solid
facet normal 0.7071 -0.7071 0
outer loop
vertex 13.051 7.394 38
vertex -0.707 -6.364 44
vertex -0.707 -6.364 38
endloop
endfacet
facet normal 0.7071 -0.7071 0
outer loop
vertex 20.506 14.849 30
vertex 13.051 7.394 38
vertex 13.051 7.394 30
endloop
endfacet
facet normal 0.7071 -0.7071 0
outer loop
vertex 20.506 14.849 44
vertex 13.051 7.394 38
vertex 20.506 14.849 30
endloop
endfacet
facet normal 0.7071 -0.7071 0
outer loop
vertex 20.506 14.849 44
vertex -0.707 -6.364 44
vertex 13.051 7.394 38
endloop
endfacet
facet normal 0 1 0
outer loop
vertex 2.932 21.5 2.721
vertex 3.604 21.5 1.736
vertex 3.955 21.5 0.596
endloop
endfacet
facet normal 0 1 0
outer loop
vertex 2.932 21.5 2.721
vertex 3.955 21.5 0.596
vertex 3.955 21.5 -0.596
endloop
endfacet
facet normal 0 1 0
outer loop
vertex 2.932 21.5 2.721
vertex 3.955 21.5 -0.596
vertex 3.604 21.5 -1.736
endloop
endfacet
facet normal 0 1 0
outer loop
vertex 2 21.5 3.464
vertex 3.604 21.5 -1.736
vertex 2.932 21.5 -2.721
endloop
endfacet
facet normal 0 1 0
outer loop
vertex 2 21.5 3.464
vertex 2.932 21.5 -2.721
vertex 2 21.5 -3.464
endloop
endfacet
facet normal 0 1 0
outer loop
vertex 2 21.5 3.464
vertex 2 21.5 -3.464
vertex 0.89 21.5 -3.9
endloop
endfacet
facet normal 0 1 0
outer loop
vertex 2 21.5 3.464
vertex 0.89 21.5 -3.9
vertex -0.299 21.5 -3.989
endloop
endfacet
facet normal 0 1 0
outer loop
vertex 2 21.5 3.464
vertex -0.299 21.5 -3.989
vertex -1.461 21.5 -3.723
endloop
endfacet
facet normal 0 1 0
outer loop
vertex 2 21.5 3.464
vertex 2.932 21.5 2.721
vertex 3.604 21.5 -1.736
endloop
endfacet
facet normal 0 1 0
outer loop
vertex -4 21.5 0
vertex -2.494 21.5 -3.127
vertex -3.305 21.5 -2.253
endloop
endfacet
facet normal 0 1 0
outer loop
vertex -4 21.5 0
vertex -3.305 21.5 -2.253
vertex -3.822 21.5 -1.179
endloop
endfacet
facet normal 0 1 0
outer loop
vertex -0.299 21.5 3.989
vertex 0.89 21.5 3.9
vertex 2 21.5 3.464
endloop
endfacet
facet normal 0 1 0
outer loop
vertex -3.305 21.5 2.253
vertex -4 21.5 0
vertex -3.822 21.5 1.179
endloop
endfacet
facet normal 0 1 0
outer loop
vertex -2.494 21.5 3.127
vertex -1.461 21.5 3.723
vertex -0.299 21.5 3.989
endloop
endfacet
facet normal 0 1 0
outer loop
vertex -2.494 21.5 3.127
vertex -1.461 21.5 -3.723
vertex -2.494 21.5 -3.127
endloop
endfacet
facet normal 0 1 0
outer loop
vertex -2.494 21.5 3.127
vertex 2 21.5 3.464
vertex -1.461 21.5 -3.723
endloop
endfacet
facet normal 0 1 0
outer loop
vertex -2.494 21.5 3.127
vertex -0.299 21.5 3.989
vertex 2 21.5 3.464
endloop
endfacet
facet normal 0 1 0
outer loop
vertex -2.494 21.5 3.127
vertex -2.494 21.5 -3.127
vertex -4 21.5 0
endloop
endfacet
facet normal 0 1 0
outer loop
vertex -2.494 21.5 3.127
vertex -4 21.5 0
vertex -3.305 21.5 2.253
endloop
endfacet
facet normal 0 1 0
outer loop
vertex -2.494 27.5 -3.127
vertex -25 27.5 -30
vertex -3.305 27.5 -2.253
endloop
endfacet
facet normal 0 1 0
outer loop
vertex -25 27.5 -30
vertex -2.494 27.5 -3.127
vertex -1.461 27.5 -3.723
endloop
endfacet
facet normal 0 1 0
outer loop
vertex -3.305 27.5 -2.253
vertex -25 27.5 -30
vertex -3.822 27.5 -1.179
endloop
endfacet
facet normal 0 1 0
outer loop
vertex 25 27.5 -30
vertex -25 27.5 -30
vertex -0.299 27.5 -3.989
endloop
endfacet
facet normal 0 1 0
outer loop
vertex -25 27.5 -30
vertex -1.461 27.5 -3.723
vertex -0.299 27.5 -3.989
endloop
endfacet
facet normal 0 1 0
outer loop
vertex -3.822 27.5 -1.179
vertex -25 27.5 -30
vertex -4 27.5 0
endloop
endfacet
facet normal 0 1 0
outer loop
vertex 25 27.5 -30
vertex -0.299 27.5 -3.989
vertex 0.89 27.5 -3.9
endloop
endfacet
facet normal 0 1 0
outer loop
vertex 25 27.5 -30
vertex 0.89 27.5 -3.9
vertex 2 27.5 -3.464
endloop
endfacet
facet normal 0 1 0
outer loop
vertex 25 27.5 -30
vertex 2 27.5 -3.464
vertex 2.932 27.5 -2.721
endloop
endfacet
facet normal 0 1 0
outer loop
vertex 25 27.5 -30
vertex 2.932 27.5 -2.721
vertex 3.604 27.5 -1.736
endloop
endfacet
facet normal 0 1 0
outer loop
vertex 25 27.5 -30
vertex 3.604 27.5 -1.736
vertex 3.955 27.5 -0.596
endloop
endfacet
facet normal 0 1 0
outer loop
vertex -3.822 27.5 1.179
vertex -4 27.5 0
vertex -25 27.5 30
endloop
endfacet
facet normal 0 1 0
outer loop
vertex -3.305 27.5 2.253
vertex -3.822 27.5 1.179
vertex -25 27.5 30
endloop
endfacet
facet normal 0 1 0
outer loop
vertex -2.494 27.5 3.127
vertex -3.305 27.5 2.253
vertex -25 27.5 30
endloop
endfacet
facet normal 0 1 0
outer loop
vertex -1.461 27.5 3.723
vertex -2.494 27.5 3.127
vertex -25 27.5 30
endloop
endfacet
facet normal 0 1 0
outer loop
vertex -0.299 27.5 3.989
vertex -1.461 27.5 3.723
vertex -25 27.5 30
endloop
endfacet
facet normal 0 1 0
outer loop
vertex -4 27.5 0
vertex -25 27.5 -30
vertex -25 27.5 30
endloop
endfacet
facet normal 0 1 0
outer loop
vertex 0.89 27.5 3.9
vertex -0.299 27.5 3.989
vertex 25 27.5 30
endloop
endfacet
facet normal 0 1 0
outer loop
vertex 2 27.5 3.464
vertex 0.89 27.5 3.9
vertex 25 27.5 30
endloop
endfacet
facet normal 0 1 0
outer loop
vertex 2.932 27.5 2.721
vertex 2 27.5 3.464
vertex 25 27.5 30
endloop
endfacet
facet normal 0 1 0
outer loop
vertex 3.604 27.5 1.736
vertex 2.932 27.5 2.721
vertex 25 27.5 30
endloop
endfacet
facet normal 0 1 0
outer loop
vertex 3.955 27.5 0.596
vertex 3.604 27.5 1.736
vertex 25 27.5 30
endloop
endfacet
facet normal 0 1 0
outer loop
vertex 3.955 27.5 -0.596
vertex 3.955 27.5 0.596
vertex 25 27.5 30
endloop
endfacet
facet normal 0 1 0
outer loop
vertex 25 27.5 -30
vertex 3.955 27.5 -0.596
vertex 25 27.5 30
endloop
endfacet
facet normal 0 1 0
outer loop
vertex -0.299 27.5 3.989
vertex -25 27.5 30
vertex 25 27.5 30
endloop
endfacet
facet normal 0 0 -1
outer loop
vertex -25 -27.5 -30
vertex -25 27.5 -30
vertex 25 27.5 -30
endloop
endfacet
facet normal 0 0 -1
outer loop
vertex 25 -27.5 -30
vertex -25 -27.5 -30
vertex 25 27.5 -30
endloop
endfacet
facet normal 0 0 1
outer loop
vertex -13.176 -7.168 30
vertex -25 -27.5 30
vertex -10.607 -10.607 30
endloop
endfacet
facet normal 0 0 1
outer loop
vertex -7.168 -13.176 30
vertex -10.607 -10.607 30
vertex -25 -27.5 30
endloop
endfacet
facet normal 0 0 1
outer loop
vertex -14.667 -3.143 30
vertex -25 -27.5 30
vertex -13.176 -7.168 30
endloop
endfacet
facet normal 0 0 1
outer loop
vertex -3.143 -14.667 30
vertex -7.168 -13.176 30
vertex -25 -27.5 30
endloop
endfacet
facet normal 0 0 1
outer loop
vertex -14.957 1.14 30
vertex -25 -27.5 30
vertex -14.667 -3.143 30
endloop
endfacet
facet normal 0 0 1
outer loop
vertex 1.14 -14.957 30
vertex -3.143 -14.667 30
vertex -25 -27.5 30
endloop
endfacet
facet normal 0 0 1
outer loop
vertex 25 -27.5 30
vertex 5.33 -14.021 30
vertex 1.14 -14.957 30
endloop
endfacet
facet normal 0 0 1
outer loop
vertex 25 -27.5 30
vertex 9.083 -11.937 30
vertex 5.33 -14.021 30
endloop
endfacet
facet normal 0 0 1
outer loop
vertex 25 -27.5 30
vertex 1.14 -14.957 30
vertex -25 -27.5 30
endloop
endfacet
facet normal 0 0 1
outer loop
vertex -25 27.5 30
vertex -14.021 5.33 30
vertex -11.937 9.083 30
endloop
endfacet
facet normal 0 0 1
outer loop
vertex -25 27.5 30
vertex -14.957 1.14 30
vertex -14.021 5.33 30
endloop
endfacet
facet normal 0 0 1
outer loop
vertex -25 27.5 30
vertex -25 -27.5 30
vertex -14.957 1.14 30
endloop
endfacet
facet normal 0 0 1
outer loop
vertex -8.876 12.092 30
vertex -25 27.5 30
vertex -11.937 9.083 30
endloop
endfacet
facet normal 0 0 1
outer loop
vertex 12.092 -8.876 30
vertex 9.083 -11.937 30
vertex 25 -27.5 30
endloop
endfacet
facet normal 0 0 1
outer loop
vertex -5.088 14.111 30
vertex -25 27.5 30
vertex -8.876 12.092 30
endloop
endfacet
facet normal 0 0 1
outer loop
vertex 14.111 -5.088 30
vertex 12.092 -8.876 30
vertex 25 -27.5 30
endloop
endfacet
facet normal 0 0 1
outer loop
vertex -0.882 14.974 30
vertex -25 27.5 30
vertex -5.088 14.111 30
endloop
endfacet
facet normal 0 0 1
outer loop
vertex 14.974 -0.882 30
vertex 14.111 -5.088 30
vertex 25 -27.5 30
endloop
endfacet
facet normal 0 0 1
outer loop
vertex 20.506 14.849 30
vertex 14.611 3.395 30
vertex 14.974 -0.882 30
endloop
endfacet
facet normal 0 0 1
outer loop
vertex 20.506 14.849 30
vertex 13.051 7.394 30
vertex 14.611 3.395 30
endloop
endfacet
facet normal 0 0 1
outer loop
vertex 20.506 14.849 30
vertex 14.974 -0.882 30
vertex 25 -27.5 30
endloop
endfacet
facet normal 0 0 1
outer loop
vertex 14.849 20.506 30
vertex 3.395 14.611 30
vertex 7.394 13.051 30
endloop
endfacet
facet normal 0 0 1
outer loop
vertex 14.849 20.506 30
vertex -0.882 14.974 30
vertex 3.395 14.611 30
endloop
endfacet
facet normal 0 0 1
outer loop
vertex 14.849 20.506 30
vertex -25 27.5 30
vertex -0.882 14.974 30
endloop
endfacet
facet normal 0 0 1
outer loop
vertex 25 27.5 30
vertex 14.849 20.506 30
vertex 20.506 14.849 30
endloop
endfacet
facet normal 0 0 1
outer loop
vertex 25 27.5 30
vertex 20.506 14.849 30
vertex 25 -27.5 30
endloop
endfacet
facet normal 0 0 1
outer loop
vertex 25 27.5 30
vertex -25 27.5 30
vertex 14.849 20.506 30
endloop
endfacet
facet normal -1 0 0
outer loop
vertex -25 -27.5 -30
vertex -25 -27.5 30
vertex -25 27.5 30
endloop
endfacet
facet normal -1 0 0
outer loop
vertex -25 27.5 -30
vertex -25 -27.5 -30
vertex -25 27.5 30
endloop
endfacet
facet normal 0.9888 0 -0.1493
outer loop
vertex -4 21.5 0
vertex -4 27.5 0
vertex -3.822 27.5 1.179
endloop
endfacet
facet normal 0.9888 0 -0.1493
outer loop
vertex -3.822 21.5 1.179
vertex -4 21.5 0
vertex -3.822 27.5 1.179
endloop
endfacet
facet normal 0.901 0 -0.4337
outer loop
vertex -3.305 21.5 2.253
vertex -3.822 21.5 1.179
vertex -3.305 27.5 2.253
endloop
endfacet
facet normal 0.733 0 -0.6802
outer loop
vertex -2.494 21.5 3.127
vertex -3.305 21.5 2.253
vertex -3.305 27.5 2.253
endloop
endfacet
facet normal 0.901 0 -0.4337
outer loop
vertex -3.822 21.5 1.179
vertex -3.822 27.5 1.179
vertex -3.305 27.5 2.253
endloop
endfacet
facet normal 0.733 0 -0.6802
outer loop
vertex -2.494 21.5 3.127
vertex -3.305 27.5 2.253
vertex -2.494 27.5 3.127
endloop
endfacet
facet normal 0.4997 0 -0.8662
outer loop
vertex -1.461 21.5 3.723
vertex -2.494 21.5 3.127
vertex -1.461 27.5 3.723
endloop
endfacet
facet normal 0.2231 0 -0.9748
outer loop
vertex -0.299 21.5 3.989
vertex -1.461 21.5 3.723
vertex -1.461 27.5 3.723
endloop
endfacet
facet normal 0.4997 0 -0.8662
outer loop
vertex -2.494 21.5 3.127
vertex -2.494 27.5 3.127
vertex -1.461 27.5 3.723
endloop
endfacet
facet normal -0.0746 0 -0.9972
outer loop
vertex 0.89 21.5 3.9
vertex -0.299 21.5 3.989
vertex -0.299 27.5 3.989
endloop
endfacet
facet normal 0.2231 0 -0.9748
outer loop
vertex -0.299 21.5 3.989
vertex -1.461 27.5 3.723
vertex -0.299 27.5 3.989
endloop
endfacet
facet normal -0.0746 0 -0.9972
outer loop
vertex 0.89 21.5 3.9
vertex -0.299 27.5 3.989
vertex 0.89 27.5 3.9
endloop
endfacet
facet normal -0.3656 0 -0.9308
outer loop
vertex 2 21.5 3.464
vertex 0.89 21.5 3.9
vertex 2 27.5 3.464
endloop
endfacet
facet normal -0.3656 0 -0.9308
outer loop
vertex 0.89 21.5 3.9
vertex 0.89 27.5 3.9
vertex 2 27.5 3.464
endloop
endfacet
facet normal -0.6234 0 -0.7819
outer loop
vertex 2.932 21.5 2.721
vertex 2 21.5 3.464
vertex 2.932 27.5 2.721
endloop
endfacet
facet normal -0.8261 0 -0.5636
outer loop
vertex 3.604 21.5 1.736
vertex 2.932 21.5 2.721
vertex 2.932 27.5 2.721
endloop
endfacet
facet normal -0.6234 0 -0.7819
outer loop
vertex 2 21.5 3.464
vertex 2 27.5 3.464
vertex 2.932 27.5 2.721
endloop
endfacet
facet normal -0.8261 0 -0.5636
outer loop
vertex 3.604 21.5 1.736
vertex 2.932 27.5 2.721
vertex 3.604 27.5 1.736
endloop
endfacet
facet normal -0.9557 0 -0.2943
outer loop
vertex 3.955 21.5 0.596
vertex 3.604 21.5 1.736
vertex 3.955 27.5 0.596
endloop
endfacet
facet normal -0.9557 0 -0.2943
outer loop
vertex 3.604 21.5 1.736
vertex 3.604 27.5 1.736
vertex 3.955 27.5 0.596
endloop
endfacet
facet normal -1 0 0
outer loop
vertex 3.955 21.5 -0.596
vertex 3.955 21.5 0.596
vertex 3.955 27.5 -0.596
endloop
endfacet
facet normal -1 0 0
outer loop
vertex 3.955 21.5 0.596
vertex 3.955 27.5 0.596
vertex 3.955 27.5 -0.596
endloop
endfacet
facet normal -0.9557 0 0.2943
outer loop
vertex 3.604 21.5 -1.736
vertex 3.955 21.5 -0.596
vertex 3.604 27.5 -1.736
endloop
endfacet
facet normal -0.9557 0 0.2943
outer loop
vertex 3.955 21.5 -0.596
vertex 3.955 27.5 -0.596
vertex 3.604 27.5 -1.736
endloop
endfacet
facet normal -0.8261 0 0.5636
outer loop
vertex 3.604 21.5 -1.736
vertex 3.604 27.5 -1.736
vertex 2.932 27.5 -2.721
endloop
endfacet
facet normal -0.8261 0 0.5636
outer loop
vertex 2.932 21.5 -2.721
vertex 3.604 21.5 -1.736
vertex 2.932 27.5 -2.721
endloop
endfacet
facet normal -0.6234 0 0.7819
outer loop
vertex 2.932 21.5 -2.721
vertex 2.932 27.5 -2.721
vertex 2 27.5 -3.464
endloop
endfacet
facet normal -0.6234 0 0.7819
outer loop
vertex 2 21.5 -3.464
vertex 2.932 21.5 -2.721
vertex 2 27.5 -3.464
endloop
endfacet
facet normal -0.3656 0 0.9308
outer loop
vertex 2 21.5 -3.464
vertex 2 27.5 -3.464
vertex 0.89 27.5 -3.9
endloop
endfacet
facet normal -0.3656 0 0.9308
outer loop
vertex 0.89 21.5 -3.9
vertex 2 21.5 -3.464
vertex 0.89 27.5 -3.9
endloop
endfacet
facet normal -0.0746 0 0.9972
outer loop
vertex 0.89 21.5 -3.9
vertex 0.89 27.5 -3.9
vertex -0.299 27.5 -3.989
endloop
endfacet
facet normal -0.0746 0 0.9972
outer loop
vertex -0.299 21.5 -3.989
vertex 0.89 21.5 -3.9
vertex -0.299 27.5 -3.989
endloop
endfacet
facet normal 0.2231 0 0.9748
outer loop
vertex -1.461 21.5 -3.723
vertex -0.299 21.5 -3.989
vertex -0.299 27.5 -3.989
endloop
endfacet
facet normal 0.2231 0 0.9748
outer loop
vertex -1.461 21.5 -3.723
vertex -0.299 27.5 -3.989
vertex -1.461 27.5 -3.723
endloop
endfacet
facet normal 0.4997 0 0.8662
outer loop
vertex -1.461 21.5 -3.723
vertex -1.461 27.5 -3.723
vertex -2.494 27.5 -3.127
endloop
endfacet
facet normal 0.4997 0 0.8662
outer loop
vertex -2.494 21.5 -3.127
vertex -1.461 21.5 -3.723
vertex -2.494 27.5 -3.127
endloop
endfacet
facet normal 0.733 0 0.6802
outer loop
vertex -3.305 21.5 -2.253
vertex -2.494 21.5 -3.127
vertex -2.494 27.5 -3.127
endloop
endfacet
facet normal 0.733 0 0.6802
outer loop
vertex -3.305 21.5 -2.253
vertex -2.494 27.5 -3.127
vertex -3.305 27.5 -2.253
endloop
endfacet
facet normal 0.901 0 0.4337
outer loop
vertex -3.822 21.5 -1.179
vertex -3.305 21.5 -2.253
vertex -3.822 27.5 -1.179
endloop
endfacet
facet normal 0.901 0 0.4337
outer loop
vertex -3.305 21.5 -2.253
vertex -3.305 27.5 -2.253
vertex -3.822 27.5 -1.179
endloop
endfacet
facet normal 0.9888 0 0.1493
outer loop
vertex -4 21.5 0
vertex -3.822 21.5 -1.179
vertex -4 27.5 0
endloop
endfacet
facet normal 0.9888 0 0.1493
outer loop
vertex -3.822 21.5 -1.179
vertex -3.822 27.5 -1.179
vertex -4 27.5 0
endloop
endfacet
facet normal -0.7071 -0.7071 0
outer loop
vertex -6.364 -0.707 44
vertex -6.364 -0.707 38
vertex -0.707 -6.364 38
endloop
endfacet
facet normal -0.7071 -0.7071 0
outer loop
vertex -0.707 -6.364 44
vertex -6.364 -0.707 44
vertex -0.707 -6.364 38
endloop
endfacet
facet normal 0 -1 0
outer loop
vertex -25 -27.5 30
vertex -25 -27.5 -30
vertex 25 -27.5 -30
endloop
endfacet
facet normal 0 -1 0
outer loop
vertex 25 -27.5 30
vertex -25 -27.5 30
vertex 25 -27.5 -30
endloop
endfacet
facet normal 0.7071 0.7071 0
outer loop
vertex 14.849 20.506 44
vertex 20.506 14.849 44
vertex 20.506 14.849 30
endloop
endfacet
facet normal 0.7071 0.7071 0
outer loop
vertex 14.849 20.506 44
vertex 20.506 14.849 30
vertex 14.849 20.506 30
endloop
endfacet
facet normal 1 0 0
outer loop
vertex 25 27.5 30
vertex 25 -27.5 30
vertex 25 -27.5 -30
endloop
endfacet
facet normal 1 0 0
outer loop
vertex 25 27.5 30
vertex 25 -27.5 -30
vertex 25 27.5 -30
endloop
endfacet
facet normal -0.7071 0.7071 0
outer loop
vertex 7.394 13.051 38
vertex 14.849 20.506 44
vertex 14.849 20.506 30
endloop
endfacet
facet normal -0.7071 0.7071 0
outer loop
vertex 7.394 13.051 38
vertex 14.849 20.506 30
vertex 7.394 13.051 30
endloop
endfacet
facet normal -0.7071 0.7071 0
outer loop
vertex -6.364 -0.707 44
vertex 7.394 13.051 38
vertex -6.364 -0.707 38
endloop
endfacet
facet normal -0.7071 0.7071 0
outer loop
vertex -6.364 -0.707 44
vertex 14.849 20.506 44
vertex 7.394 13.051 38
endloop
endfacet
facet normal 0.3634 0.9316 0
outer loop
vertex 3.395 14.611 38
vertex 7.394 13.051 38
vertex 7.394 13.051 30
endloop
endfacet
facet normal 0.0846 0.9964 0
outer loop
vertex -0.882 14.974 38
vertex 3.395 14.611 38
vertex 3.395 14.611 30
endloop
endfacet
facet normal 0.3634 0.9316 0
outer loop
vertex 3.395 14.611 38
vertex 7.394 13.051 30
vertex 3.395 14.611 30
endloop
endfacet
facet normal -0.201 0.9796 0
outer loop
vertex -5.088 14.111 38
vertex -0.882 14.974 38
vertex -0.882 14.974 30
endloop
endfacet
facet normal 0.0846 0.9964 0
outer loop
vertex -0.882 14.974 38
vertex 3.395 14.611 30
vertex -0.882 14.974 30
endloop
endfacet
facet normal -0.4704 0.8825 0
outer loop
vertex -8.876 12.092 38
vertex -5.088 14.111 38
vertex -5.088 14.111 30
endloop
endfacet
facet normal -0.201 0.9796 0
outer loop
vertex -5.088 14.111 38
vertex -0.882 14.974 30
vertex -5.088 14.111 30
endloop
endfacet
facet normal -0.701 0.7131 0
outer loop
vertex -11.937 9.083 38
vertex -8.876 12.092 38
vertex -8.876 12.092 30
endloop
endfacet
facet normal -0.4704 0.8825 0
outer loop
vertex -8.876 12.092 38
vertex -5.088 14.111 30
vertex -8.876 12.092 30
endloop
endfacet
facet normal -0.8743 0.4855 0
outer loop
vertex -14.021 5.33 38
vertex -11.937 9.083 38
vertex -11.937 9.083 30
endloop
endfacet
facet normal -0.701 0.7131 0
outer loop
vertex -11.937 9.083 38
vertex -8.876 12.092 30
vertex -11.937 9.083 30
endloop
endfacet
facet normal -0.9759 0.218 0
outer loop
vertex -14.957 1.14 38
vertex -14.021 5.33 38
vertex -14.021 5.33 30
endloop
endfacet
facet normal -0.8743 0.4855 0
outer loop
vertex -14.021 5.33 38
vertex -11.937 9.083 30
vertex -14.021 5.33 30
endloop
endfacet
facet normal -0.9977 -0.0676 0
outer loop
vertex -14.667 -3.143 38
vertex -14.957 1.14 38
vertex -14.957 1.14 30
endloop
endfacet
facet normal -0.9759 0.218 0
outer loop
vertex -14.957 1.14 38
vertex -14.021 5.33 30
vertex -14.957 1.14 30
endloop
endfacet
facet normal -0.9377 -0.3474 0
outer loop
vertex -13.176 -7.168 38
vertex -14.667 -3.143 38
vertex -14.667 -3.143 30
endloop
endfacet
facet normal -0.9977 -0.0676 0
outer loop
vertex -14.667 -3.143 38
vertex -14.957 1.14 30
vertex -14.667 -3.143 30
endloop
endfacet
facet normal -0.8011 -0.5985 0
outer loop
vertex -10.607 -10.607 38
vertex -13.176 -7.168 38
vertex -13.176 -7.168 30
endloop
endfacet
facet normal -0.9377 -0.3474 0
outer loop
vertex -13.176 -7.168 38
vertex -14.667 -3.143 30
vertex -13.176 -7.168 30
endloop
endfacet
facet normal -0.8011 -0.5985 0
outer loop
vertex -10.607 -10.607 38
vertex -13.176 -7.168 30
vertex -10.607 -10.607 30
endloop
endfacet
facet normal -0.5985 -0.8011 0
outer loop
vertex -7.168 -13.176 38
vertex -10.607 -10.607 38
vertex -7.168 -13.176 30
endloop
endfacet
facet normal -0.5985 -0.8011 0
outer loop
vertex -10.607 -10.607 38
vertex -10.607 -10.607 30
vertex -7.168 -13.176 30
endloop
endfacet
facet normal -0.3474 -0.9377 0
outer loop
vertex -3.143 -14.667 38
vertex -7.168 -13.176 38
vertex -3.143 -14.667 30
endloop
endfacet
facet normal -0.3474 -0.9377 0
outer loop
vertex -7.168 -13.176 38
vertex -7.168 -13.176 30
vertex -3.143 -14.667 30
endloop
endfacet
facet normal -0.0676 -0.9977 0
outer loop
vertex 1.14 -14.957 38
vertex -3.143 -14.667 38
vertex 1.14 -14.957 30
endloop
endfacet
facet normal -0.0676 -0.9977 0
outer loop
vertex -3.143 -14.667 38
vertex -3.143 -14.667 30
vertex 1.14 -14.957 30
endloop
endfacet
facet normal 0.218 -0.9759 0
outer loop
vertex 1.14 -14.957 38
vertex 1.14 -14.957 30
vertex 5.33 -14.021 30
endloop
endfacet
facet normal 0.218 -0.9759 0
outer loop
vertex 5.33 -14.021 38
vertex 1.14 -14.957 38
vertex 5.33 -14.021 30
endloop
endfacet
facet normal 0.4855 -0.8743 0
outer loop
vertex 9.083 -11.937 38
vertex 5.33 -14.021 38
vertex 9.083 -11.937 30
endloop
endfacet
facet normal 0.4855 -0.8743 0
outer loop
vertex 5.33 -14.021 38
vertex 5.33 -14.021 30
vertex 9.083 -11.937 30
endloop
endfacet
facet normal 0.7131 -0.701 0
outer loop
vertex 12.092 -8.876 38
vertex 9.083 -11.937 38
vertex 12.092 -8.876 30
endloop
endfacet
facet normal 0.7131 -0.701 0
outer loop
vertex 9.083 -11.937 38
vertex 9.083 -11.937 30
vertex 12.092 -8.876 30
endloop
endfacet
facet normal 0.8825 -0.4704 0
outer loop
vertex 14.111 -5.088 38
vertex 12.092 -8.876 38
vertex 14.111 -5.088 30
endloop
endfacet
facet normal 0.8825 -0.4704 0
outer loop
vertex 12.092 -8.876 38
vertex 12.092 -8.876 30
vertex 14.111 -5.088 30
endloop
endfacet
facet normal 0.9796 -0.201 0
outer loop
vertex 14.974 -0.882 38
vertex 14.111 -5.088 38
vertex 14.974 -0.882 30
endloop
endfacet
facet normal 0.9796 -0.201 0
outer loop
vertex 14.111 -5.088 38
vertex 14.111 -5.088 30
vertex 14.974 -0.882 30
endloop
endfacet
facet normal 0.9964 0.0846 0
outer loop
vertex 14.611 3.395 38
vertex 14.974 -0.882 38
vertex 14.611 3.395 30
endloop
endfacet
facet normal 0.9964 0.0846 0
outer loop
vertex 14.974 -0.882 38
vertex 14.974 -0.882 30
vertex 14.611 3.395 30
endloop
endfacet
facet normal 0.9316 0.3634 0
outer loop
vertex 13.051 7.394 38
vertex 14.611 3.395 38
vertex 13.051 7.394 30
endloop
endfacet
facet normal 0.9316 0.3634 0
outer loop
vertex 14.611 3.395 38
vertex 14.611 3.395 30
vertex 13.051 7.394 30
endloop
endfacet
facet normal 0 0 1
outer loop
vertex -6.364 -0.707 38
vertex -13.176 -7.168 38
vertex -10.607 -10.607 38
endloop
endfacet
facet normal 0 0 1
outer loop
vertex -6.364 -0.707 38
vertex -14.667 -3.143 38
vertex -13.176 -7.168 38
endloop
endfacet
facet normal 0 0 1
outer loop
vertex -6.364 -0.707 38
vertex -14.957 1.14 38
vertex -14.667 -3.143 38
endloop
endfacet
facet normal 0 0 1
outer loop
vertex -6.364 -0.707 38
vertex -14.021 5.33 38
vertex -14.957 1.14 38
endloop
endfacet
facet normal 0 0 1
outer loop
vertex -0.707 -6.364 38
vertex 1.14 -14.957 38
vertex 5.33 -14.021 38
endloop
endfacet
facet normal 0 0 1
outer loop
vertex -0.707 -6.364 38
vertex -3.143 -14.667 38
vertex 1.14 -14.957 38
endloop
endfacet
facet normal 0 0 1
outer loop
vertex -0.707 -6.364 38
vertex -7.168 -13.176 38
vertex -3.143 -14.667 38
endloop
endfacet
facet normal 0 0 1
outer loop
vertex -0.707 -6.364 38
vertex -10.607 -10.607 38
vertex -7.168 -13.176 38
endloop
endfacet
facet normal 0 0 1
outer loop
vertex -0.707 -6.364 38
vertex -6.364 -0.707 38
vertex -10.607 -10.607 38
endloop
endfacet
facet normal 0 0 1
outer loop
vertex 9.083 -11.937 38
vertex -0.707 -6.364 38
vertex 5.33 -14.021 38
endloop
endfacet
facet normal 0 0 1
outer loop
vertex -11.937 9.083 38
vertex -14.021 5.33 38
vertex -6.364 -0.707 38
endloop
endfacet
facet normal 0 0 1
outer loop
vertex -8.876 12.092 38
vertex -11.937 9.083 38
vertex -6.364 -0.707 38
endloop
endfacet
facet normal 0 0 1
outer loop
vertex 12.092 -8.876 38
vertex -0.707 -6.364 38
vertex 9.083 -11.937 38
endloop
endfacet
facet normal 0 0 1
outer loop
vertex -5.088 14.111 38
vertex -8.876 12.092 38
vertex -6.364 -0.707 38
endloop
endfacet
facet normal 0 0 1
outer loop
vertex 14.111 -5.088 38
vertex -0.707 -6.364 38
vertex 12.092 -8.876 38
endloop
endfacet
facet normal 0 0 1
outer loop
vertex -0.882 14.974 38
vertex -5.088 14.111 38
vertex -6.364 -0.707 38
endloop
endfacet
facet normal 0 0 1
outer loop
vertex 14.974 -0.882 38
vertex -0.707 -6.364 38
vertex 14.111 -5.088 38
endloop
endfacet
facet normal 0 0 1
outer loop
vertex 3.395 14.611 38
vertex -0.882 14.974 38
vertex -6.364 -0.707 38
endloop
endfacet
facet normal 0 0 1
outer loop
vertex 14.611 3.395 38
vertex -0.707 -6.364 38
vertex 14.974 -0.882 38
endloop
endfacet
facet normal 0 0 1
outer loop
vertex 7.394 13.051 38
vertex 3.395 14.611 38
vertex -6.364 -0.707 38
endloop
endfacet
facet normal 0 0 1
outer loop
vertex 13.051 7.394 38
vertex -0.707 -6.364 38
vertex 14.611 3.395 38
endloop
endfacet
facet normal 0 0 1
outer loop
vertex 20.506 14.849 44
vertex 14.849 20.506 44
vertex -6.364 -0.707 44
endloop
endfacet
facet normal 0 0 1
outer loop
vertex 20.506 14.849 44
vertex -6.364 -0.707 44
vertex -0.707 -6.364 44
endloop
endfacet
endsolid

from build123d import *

# Parameters (mm, degrees)
SKETCH_1_W                  = 50
SKETCH_1_H                  = 55
EXTRUDE_1_DEPTH             = 30
SKETCH_2_R                  = 15
EXTRUDE_2_DEPTH             = 8
EXTRUDE_3_DEPTH             = 6
EXTRUDE_3_DIRECTION_2_REACH = 79.494
SKETCH_4_R                  = 4
CUT_EXTRUDE_1_DEPTH         = 6


with BuildPart() as part:
    # 草图1 → 凸台-拉伸1 (new, symmetric)
    with BuildSketch(Plane.XY):
        Rectangle(SKETCH_1_W, SKETCH_1_H)
    extrude(amount=EXTRUDE_1_DEPTH, both=True)

    # 草图2 → 凸台-拉伸2 (add)
    with BuildSketch(Plane.XY.offset(30)):
        Circle(SKETCH_2_R)
    extrude(amount=EXTRUDE_2_DEPTH)

    # 草图3 → 凸台-拉伸3 (add)
    with BuildSketch(Plane.XY.offset(38)):
        Polygon((14.849242405, 20.506096654), (-6.363961031, -0.707106781), (-0.707106781, -6.363961031), (20.506096654, 14.849242405), align=None)
    extrude(amount=EXTRUDE_3_DEPTH)

    # 草图3 → 凸台-拉伸3 direction 2 (add, up to next)
    with BuildSketch(Plane.XY.offset(38), mode=Mode.PRIVATE) as extrude_3_direction_2_sk1:
        Polygon((14.849242405, 20.506096654), (-6.363961031, -0.707106781), (-0.707106781, -6.363961031), (20.506096654, 14.849242405), align=None)
    extrude_3_direction_2_tool1 = extrude(extrude_3_direction_2_sk1.sketch, amount=-EXTRUDE_3_DIRECTION_2_REACH, mode=Mode.PRIVATE) - part.part
    add(extrude_3_direction_2_tool1.solids().sort_by_distance((7.071068, 7.071068, 38))[0])

    # 草图4 → 切除-拉伸1 (cut)
    with BuildSketch(Plane(origin=(0, 27.5, 0), x_dir=(1, 0, 0), z_dir=(0, 1, 0))):
        with Locations(Location((0, 0, 0), (0, 0, 180))):
            Circle(SKETCH_4_R)
    extrude(amount=-CUT_EXTRUDE_1_DEPTH, mode=Mode.SUBTRACT)


solid = part.part
